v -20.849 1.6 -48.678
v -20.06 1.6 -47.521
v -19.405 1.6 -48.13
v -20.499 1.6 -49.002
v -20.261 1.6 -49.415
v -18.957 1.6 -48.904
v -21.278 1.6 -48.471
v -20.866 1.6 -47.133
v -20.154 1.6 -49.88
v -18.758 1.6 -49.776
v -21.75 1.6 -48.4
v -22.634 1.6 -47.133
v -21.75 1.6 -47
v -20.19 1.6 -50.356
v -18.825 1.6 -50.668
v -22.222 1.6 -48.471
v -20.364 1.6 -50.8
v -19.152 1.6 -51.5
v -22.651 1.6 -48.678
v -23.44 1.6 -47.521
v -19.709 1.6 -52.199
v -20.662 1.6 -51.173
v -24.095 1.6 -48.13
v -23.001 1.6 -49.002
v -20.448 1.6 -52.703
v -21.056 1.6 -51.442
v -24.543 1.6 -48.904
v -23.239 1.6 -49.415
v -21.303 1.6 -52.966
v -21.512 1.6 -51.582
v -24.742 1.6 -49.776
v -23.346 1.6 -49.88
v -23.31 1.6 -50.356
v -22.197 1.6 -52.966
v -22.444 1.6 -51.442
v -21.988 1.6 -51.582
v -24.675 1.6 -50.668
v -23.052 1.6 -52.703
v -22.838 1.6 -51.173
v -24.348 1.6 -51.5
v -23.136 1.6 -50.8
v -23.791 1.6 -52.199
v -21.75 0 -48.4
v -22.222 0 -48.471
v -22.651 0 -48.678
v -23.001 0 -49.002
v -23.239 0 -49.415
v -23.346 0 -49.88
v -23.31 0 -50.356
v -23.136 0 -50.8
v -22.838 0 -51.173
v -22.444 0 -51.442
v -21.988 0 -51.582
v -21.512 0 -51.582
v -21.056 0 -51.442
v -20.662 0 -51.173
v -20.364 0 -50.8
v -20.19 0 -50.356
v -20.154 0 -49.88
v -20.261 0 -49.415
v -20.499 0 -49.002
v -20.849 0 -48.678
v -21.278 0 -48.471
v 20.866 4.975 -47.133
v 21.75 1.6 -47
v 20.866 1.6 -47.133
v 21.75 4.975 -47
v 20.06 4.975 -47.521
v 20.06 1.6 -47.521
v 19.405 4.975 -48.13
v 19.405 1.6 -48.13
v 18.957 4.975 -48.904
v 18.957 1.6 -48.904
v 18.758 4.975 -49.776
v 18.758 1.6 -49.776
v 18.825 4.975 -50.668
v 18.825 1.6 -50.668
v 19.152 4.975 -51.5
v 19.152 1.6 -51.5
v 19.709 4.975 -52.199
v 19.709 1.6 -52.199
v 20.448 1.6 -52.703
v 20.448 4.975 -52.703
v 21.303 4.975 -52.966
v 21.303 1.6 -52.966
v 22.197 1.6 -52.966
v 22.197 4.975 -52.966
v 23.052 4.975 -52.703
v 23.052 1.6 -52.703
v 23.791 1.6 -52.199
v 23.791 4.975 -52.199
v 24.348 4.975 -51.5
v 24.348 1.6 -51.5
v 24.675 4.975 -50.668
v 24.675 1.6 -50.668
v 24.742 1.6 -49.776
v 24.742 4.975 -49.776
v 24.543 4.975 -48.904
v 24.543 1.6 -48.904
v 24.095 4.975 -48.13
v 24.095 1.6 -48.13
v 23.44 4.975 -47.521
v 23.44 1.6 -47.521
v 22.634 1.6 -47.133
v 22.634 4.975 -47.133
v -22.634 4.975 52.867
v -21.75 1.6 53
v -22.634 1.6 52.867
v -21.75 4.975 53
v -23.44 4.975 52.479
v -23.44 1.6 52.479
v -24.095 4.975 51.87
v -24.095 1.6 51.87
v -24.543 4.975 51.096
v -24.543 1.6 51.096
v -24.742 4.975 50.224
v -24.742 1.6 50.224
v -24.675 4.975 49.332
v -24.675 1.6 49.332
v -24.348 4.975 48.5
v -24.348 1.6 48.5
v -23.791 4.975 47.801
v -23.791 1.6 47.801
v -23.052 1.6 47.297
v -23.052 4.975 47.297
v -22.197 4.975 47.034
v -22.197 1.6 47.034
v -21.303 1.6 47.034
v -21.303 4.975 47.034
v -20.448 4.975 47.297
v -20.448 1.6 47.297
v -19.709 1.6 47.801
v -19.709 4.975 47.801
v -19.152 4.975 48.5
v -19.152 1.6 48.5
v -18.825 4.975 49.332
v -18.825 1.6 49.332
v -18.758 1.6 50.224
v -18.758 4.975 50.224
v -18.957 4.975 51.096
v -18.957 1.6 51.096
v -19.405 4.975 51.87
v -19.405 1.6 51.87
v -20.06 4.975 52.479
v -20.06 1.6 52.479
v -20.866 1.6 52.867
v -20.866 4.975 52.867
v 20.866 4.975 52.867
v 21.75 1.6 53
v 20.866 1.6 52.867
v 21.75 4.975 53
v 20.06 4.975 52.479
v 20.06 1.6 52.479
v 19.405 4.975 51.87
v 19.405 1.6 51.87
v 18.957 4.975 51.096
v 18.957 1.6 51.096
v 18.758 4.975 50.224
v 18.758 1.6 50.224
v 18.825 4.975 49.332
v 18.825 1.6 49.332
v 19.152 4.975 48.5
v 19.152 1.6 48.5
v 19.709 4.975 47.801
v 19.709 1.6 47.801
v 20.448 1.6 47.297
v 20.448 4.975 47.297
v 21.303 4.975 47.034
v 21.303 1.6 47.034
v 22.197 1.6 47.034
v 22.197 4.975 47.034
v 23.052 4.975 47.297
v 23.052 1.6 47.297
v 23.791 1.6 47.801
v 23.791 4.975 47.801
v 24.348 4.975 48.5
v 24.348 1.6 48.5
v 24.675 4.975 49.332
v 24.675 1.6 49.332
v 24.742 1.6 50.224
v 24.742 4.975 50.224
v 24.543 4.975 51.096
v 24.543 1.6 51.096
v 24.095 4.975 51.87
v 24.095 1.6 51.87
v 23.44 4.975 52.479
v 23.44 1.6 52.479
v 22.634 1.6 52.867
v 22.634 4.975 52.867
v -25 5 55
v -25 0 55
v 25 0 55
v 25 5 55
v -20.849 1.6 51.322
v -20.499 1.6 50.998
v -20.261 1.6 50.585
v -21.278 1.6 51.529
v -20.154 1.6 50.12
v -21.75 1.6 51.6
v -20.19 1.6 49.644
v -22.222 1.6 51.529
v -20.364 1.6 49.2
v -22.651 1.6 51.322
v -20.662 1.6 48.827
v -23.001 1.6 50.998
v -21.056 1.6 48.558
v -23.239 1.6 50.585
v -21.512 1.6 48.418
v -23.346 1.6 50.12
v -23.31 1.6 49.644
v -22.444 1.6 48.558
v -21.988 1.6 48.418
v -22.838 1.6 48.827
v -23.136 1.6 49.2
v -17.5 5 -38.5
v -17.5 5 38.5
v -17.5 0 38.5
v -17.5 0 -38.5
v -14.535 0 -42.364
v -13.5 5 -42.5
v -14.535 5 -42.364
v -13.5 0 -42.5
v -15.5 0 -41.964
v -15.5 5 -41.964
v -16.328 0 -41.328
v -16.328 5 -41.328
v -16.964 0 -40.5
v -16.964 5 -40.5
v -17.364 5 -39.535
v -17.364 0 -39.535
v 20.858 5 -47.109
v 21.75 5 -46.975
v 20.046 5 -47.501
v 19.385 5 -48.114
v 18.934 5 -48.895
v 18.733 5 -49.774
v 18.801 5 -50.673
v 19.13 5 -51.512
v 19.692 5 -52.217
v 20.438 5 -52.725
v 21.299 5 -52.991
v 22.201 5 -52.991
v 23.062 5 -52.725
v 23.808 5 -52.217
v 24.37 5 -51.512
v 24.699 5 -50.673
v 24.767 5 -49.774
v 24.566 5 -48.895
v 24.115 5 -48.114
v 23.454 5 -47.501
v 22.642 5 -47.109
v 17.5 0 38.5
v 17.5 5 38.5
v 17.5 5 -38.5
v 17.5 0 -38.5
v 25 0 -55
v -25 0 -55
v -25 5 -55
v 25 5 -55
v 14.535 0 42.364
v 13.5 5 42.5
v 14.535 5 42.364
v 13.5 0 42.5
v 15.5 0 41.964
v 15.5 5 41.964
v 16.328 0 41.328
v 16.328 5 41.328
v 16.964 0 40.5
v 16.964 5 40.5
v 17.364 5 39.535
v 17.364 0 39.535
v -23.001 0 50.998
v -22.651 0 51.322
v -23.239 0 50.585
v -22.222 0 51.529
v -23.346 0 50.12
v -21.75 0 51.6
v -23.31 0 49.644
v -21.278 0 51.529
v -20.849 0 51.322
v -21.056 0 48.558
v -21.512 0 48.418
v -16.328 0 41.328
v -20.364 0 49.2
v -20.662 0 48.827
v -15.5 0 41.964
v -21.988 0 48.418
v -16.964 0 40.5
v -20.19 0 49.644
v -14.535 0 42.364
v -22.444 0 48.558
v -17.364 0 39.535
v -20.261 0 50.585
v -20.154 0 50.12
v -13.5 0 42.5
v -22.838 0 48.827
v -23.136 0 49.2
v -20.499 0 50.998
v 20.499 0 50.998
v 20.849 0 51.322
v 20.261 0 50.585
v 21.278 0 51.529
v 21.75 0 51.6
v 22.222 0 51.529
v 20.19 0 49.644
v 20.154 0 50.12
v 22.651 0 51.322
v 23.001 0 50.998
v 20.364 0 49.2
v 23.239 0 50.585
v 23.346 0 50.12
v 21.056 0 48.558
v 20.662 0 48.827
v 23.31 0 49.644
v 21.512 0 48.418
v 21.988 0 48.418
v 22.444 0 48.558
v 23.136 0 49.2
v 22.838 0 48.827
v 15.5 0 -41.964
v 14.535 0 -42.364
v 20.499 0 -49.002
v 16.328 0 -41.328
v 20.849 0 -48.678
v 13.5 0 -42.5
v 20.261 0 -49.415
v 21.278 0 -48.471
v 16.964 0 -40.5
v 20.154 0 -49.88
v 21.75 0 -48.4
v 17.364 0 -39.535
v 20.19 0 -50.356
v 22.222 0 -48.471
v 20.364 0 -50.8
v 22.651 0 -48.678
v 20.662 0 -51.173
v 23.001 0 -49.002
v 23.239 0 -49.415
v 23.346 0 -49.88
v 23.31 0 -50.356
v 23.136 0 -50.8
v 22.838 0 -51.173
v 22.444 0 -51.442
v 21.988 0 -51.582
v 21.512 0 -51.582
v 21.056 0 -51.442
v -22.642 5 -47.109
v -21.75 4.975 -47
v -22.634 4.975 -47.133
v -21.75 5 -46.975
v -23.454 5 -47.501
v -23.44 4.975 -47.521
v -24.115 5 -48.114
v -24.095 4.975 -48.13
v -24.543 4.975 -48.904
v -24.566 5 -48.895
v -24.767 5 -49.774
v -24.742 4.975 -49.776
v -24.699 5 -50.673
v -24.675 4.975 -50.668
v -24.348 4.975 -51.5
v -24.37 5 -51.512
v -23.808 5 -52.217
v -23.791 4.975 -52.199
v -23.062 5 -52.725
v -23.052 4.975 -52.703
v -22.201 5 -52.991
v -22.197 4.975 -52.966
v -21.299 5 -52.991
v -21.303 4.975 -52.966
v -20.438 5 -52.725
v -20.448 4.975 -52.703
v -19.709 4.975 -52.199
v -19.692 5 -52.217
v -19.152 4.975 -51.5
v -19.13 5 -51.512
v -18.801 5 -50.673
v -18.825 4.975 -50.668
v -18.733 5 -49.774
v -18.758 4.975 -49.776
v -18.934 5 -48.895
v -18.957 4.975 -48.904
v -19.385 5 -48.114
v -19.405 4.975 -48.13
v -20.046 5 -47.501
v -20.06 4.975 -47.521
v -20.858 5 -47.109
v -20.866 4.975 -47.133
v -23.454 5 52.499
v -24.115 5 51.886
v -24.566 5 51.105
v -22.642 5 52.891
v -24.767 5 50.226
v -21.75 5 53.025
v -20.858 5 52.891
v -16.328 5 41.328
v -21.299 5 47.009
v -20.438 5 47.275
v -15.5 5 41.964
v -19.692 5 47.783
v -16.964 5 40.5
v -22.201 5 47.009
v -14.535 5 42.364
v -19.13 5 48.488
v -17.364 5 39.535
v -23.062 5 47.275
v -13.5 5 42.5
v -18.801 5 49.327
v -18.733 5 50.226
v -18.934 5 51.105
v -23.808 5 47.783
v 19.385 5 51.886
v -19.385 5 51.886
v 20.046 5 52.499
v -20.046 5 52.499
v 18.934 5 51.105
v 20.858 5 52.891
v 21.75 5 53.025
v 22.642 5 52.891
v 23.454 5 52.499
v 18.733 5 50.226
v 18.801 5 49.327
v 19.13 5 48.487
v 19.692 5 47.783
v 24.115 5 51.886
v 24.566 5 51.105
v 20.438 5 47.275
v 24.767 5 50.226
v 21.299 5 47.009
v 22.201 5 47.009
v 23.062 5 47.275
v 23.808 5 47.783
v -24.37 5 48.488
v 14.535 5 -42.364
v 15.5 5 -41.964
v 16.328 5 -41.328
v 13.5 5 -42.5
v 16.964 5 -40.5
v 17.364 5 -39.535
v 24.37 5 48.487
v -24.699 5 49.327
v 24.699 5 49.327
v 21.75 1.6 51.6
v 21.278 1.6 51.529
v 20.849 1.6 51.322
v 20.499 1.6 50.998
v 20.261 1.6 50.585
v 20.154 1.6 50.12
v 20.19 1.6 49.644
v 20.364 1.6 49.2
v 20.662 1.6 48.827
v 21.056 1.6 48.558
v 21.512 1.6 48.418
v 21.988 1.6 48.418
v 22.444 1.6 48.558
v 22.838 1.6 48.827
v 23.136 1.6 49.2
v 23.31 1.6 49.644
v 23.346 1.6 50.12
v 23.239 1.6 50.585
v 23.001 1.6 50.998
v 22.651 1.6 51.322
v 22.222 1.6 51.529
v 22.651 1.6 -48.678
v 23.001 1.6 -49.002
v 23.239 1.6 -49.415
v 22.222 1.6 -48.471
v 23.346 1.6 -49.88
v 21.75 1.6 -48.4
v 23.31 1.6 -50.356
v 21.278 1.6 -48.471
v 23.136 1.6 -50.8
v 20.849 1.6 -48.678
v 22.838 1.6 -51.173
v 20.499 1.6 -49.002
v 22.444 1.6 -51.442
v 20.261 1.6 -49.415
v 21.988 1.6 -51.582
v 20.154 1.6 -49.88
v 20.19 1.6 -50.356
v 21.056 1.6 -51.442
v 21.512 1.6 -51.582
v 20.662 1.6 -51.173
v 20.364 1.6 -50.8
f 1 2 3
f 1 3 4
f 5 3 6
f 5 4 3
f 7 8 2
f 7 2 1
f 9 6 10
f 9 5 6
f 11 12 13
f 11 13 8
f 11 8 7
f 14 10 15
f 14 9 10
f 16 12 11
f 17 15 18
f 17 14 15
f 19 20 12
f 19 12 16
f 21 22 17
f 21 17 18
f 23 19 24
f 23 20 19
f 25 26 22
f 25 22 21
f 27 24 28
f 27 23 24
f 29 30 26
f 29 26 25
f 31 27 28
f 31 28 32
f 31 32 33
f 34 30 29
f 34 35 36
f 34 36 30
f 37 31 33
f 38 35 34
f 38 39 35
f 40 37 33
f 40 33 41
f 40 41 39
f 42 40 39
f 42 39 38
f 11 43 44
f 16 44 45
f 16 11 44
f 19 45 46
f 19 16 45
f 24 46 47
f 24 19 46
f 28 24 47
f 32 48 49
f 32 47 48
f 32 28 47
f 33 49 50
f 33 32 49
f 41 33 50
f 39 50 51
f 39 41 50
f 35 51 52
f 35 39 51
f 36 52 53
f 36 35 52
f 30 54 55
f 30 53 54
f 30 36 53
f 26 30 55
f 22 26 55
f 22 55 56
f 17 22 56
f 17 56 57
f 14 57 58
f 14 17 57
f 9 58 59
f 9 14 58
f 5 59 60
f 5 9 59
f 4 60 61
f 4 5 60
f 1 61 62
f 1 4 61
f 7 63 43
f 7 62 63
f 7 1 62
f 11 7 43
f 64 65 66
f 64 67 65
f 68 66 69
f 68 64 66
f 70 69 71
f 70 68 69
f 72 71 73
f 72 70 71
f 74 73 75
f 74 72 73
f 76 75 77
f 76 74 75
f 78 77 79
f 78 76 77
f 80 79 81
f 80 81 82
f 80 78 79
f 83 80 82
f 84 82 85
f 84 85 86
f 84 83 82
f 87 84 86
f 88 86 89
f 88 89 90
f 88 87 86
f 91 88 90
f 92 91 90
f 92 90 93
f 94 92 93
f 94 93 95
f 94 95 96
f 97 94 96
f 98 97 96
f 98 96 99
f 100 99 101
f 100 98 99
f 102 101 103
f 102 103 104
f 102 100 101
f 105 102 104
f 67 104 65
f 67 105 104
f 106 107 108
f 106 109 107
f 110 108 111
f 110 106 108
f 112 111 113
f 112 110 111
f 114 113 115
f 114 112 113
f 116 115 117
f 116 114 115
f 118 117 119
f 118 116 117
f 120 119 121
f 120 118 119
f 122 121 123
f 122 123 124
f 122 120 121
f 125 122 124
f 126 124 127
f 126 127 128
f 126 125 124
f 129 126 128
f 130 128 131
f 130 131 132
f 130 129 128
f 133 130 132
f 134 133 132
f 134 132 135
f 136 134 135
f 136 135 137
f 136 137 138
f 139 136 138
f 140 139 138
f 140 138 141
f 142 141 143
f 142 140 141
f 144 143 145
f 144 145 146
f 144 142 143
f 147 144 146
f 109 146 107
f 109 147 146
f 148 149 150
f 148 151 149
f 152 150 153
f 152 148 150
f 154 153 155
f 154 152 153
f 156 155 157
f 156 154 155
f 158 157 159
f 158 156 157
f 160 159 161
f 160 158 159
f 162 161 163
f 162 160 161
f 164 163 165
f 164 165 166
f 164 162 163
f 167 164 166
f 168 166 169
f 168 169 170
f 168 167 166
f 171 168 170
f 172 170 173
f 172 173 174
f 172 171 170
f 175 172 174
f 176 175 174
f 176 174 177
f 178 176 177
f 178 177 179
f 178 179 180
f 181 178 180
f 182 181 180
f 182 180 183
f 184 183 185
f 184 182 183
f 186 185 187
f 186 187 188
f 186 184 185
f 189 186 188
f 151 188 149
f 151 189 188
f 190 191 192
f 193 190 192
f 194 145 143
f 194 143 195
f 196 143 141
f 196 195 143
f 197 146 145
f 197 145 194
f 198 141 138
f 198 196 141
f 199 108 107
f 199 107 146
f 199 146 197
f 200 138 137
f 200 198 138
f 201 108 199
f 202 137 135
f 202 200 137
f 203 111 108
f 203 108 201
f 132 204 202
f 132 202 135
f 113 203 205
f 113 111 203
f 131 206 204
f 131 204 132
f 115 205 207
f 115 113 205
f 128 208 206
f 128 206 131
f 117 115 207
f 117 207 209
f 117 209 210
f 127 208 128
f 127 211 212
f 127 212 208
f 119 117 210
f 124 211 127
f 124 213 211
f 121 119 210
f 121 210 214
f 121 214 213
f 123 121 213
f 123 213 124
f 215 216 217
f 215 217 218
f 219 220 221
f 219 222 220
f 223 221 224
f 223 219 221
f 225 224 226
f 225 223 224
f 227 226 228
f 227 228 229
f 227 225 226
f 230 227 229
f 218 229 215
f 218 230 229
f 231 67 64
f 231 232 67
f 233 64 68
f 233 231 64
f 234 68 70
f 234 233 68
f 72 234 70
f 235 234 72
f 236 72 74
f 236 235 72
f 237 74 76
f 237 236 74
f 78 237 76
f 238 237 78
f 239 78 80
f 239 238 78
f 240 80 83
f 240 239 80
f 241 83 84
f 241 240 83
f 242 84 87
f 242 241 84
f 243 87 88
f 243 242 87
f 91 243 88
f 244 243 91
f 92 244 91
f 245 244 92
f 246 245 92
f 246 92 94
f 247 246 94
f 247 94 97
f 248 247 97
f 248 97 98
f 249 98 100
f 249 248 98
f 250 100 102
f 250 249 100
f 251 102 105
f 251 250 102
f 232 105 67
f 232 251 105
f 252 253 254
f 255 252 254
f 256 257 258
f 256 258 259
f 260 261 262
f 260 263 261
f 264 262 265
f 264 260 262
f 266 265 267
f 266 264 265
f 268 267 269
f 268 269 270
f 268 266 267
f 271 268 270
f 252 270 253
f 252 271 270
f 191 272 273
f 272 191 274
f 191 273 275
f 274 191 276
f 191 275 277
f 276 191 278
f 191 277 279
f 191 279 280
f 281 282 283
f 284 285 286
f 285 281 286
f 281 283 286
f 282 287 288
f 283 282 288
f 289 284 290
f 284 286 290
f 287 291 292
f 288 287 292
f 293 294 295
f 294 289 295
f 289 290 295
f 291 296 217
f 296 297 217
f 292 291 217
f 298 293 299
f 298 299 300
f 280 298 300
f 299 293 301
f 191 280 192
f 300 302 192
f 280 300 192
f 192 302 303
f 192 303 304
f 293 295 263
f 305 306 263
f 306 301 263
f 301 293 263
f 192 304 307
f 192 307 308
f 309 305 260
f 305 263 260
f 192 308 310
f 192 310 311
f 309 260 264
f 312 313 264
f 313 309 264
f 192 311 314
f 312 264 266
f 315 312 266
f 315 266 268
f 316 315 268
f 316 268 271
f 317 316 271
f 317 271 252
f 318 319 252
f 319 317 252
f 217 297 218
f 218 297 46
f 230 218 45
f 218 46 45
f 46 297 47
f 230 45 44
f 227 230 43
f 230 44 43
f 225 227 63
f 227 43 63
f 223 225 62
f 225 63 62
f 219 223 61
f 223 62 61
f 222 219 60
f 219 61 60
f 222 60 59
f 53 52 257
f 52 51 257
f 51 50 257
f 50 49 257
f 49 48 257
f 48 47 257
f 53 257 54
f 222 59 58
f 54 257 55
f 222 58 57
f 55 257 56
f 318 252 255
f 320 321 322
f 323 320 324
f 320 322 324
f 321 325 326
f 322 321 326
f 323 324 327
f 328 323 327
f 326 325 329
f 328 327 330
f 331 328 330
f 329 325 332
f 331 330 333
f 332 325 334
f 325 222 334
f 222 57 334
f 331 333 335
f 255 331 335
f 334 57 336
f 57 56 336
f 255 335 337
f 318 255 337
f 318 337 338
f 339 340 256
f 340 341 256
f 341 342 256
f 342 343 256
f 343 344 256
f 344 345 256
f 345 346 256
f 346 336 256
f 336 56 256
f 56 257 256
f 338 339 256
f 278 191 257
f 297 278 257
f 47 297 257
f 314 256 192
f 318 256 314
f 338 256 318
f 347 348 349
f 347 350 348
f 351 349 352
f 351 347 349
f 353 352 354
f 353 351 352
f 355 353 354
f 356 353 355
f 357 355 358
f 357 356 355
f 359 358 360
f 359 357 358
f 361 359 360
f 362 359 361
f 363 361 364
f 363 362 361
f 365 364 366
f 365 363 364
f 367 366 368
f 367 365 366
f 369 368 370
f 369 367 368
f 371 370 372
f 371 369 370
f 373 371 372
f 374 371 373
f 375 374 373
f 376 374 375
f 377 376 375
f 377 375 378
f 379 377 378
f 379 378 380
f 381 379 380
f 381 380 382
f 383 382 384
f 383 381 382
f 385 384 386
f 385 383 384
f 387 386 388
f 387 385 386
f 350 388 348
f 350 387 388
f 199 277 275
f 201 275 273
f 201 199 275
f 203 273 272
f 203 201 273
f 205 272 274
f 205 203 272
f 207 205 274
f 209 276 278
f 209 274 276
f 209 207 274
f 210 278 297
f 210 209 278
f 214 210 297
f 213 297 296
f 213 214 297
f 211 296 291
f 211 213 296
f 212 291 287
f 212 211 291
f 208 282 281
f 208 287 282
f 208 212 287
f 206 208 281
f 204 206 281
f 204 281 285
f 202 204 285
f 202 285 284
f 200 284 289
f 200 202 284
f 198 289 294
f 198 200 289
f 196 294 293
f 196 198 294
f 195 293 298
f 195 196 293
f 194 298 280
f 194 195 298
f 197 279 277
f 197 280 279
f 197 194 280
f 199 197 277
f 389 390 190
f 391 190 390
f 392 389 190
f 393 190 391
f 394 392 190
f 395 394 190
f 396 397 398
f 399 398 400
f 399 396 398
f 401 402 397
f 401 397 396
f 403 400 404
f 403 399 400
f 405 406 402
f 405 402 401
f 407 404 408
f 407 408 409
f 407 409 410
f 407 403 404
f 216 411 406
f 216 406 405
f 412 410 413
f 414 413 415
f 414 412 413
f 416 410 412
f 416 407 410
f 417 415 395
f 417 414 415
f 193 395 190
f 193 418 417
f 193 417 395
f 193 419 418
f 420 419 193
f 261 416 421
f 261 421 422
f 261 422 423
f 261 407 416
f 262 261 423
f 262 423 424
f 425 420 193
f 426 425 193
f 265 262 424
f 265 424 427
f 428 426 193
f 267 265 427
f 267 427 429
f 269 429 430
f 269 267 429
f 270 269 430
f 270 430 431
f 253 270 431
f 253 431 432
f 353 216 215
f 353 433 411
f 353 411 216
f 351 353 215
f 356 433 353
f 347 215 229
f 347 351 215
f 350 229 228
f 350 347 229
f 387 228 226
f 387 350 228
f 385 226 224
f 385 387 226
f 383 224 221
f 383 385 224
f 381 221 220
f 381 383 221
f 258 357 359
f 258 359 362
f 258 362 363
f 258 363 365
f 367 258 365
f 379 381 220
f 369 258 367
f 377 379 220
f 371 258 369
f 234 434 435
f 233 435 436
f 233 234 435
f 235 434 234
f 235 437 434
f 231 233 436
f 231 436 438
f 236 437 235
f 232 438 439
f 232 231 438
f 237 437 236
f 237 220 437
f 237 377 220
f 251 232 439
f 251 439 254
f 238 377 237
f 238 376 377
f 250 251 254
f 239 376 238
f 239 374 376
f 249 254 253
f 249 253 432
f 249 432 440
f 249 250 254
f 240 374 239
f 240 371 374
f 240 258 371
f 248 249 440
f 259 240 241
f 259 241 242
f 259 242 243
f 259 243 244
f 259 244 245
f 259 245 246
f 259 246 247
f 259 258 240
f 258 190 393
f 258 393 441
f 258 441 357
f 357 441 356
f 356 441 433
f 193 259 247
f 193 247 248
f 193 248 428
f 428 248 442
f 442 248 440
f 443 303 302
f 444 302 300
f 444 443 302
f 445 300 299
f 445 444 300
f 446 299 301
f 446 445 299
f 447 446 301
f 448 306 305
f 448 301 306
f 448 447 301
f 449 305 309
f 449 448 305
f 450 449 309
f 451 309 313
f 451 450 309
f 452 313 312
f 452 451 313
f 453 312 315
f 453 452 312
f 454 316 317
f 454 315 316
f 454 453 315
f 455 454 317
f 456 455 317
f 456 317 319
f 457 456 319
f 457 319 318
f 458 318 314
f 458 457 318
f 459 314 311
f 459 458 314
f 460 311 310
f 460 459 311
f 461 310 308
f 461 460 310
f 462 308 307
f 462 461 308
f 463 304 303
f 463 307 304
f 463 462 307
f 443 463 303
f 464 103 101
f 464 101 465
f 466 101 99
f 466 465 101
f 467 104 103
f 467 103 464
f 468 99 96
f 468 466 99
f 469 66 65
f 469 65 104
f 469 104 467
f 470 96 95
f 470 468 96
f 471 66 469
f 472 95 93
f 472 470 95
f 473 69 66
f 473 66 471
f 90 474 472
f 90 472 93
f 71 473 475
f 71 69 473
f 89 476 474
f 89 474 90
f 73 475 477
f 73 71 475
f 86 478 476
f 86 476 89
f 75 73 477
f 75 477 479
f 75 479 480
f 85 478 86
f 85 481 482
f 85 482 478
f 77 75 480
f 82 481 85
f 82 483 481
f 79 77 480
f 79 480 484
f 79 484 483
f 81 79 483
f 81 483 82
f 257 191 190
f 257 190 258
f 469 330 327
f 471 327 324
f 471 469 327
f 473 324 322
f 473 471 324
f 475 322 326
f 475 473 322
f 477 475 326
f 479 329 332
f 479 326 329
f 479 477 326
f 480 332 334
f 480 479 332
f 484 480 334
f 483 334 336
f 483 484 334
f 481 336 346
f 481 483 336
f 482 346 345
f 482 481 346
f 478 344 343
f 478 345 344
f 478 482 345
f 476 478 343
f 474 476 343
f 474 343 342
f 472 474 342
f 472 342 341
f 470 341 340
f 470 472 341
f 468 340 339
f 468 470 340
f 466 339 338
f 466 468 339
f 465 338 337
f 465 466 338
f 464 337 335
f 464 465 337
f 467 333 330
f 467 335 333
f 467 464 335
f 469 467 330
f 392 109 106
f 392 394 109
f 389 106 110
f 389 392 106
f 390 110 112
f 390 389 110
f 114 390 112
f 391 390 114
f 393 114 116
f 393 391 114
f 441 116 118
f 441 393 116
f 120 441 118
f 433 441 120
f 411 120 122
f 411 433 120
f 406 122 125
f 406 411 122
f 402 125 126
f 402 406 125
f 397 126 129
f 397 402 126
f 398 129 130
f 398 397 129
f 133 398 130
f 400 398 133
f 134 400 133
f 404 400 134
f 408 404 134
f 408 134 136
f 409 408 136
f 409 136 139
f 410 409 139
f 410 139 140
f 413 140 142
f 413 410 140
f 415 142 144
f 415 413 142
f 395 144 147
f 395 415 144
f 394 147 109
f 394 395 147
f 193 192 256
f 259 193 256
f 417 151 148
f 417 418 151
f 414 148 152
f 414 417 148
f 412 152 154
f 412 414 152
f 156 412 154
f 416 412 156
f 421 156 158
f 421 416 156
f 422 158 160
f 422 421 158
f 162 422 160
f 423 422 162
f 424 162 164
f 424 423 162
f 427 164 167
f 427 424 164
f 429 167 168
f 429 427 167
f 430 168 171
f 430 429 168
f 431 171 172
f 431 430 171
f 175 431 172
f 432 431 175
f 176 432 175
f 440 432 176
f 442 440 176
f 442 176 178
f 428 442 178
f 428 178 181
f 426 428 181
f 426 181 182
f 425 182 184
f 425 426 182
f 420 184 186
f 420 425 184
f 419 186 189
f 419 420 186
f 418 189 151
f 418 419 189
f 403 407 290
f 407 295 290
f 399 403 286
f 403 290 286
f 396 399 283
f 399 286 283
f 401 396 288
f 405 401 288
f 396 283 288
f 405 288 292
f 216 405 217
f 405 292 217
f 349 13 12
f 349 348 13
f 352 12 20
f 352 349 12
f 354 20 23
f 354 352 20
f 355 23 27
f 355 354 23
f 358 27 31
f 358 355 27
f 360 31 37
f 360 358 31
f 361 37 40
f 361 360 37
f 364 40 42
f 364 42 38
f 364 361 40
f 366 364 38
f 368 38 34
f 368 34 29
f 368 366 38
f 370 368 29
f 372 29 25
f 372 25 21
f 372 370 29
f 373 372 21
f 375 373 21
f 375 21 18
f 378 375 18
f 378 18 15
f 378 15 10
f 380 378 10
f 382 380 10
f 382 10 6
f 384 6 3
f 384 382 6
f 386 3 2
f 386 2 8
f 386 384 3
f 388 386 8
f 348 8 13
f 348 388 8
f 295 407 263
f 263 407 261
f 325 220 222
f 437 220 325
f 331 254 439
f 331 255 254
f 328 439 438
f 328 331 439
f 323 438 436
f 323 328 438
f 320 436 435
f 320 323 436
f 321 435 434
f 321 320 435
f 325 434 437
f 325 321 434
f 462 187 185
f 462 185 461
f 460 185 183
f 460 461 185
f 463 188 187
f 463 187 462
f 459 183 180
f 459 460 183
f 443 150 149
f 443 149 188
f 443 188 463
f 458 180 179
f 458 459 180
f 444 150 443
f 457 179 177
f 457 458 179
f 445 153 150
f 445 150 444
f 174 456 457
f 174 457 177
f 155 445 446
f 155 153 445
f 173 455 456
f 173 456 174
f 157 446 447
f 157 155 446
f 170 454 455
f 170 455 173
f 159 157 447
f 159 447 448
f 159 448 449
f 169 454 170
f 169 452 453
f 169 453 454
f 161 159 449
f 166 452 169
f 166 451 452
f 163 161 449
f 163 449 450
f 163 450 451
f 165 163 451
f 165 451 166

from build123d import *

# Parameters (mm, degrees)
SKETCH1_W                                    = 50
SKETCH1_H                                    = 110
BOSS_EXTRUDE1_DEPTH                          = 5
CBORE_FOR_M3_HEXAGON_SOCKET_HEAD_CAP_2_COUNT = 2
CBORE_FOR_M3_HEXAGON_SOCKET_HEAD_CAP_2_PITCH = 43.5
CBORE_FOR_M3_HEXAGON_SOCKET_HEAD_CAP_3_COUNT = 2
CBORE_FOR_M3_HEXAGON_SOCKET_HEAD_CAP_3_PITCH = 100
CBORE_FOR_M3_HEXAGON_SOCKET_HEAD_CAP_4_COUNT = 2
CBORE_FOR_M3_HEXAGON_SOCKET_HEAD_CAP_4_PITCH = 109.051593294
SKETCH5_W                                    = 35
SKETCH5_H                                    = 85
CUT_EXTRUDE1_DEPTH                           = 61.621778265
FILLET1_R                                    = 4


with BuildPart() as part:
    # Sketch1 → Boss-Extrude1 (new body)
    with BuildSketch(Plane(origin=(0, 0, 0), x_dir=(1, 0, 0), z_dir=(0, 1, 0))):
        Rectangle(SKETCH1_W, SKETCH1_H)
    extrude(amount=BOSS_EXTRUDE1_DEPTH)

    # Sketch4 → CBORE for M3 Hexagon socket head cap screws1 (revolve, cut)
    with BuildSketch(Plane(origin=(-21.75, 5, -50), x_dir=(0, 0, 1), z_dir=(1, 0, 0))):
        Polygon((0, 0), (0, 10.96137699), (1.6, 10), (1.6, 3.4), (3, 3.4), (3, 0.025), (3.025, 0), align=None)
    cbore_for_m3_hexagon_socket_head_cap_scr = revolve(axis=Axis((-21.75, 11.35, -50), (0, -1, 0)), mode=Mode.SUBTRACT)

    # CBORE for M3 Hexagon socket head cap 2: CBORE for M3 Hexagon socket head cap screws1 ×2
    with Locations(*[(i * CBORE_FOR_M3_HEXAGON_SOCKET_HEAD_CAP_2_PITCH, 0, 0) for i in range(1, CBORE_FOR_M3_HEXAGON_SOCKET_HEAD_CAP_2_COUNT)]):
        add(cbore_for_m3_hexagon_socket_head_cap_scr, mode=Mode.SUBTRACT)

    # CBORE for M3 Hexagon socket head cap 3: CBORE for M3 Hexagon socket head cap screws1 ×2
    with Locations(*[(0, 0, i * CBORE_FOR_M3_HEXAGON_SOCKET_HEAD_CAP_3_PITCH) for i in range(1, CBORE_FOR_M3_HEXAGON_SOCKET_HEAD_CAP_3_COUNT)]):
        add(cbore_for_m3_hexagon_socket_head_cap_scr, mode=Mode.SUBTRACT)

    # CBORE for M3 Hexagon socket head cap 4: CBORE for M3 Hexagon socket head cap screws1 ×2
    with Locations(*[Vector(0.3988937592379055, 0, 0.9169971476733457) * (i * CBORE_FOR_M3_HEXAGON_SOCKET_HEAD_CAP_4_PITCH) for i in range(1, CBORE_FOR_M3_HEXAGON_SOCKET_HEAD_CAP_4_COUNT)]):
        add(cbore_for_m3_hexagon_socket_head_cap_scr, mode=Mode.SUBTRACT)

    # Sketch5 → Cut-Extrude1 (cut, through all)
    with BuildSketch(Plane(origin=(0, 5, 0), x_dir=(1, 0, 0), z_dir=(0, 1, 0))):
        Rectangle(SKETCH5_W, SKETCH5_H)
    extrude(amount=-CUT_EXTRUDE1_DEPTH, mode=Mode.SUBTRACT)

    # Fillet1
    fillet1_edges = [part.edges().sort_by_distance(p)[0] for p in [
        (-17.5, 2.5, 42.5),
        (-17.5, 2.5, -42.5),
        (17.5, 2.5, -42.5),
        (17.5, 2.5, 42.5),
    ]]
    fillet(fillet1_edges, radius=FILLET1_R)


solid = part.part
